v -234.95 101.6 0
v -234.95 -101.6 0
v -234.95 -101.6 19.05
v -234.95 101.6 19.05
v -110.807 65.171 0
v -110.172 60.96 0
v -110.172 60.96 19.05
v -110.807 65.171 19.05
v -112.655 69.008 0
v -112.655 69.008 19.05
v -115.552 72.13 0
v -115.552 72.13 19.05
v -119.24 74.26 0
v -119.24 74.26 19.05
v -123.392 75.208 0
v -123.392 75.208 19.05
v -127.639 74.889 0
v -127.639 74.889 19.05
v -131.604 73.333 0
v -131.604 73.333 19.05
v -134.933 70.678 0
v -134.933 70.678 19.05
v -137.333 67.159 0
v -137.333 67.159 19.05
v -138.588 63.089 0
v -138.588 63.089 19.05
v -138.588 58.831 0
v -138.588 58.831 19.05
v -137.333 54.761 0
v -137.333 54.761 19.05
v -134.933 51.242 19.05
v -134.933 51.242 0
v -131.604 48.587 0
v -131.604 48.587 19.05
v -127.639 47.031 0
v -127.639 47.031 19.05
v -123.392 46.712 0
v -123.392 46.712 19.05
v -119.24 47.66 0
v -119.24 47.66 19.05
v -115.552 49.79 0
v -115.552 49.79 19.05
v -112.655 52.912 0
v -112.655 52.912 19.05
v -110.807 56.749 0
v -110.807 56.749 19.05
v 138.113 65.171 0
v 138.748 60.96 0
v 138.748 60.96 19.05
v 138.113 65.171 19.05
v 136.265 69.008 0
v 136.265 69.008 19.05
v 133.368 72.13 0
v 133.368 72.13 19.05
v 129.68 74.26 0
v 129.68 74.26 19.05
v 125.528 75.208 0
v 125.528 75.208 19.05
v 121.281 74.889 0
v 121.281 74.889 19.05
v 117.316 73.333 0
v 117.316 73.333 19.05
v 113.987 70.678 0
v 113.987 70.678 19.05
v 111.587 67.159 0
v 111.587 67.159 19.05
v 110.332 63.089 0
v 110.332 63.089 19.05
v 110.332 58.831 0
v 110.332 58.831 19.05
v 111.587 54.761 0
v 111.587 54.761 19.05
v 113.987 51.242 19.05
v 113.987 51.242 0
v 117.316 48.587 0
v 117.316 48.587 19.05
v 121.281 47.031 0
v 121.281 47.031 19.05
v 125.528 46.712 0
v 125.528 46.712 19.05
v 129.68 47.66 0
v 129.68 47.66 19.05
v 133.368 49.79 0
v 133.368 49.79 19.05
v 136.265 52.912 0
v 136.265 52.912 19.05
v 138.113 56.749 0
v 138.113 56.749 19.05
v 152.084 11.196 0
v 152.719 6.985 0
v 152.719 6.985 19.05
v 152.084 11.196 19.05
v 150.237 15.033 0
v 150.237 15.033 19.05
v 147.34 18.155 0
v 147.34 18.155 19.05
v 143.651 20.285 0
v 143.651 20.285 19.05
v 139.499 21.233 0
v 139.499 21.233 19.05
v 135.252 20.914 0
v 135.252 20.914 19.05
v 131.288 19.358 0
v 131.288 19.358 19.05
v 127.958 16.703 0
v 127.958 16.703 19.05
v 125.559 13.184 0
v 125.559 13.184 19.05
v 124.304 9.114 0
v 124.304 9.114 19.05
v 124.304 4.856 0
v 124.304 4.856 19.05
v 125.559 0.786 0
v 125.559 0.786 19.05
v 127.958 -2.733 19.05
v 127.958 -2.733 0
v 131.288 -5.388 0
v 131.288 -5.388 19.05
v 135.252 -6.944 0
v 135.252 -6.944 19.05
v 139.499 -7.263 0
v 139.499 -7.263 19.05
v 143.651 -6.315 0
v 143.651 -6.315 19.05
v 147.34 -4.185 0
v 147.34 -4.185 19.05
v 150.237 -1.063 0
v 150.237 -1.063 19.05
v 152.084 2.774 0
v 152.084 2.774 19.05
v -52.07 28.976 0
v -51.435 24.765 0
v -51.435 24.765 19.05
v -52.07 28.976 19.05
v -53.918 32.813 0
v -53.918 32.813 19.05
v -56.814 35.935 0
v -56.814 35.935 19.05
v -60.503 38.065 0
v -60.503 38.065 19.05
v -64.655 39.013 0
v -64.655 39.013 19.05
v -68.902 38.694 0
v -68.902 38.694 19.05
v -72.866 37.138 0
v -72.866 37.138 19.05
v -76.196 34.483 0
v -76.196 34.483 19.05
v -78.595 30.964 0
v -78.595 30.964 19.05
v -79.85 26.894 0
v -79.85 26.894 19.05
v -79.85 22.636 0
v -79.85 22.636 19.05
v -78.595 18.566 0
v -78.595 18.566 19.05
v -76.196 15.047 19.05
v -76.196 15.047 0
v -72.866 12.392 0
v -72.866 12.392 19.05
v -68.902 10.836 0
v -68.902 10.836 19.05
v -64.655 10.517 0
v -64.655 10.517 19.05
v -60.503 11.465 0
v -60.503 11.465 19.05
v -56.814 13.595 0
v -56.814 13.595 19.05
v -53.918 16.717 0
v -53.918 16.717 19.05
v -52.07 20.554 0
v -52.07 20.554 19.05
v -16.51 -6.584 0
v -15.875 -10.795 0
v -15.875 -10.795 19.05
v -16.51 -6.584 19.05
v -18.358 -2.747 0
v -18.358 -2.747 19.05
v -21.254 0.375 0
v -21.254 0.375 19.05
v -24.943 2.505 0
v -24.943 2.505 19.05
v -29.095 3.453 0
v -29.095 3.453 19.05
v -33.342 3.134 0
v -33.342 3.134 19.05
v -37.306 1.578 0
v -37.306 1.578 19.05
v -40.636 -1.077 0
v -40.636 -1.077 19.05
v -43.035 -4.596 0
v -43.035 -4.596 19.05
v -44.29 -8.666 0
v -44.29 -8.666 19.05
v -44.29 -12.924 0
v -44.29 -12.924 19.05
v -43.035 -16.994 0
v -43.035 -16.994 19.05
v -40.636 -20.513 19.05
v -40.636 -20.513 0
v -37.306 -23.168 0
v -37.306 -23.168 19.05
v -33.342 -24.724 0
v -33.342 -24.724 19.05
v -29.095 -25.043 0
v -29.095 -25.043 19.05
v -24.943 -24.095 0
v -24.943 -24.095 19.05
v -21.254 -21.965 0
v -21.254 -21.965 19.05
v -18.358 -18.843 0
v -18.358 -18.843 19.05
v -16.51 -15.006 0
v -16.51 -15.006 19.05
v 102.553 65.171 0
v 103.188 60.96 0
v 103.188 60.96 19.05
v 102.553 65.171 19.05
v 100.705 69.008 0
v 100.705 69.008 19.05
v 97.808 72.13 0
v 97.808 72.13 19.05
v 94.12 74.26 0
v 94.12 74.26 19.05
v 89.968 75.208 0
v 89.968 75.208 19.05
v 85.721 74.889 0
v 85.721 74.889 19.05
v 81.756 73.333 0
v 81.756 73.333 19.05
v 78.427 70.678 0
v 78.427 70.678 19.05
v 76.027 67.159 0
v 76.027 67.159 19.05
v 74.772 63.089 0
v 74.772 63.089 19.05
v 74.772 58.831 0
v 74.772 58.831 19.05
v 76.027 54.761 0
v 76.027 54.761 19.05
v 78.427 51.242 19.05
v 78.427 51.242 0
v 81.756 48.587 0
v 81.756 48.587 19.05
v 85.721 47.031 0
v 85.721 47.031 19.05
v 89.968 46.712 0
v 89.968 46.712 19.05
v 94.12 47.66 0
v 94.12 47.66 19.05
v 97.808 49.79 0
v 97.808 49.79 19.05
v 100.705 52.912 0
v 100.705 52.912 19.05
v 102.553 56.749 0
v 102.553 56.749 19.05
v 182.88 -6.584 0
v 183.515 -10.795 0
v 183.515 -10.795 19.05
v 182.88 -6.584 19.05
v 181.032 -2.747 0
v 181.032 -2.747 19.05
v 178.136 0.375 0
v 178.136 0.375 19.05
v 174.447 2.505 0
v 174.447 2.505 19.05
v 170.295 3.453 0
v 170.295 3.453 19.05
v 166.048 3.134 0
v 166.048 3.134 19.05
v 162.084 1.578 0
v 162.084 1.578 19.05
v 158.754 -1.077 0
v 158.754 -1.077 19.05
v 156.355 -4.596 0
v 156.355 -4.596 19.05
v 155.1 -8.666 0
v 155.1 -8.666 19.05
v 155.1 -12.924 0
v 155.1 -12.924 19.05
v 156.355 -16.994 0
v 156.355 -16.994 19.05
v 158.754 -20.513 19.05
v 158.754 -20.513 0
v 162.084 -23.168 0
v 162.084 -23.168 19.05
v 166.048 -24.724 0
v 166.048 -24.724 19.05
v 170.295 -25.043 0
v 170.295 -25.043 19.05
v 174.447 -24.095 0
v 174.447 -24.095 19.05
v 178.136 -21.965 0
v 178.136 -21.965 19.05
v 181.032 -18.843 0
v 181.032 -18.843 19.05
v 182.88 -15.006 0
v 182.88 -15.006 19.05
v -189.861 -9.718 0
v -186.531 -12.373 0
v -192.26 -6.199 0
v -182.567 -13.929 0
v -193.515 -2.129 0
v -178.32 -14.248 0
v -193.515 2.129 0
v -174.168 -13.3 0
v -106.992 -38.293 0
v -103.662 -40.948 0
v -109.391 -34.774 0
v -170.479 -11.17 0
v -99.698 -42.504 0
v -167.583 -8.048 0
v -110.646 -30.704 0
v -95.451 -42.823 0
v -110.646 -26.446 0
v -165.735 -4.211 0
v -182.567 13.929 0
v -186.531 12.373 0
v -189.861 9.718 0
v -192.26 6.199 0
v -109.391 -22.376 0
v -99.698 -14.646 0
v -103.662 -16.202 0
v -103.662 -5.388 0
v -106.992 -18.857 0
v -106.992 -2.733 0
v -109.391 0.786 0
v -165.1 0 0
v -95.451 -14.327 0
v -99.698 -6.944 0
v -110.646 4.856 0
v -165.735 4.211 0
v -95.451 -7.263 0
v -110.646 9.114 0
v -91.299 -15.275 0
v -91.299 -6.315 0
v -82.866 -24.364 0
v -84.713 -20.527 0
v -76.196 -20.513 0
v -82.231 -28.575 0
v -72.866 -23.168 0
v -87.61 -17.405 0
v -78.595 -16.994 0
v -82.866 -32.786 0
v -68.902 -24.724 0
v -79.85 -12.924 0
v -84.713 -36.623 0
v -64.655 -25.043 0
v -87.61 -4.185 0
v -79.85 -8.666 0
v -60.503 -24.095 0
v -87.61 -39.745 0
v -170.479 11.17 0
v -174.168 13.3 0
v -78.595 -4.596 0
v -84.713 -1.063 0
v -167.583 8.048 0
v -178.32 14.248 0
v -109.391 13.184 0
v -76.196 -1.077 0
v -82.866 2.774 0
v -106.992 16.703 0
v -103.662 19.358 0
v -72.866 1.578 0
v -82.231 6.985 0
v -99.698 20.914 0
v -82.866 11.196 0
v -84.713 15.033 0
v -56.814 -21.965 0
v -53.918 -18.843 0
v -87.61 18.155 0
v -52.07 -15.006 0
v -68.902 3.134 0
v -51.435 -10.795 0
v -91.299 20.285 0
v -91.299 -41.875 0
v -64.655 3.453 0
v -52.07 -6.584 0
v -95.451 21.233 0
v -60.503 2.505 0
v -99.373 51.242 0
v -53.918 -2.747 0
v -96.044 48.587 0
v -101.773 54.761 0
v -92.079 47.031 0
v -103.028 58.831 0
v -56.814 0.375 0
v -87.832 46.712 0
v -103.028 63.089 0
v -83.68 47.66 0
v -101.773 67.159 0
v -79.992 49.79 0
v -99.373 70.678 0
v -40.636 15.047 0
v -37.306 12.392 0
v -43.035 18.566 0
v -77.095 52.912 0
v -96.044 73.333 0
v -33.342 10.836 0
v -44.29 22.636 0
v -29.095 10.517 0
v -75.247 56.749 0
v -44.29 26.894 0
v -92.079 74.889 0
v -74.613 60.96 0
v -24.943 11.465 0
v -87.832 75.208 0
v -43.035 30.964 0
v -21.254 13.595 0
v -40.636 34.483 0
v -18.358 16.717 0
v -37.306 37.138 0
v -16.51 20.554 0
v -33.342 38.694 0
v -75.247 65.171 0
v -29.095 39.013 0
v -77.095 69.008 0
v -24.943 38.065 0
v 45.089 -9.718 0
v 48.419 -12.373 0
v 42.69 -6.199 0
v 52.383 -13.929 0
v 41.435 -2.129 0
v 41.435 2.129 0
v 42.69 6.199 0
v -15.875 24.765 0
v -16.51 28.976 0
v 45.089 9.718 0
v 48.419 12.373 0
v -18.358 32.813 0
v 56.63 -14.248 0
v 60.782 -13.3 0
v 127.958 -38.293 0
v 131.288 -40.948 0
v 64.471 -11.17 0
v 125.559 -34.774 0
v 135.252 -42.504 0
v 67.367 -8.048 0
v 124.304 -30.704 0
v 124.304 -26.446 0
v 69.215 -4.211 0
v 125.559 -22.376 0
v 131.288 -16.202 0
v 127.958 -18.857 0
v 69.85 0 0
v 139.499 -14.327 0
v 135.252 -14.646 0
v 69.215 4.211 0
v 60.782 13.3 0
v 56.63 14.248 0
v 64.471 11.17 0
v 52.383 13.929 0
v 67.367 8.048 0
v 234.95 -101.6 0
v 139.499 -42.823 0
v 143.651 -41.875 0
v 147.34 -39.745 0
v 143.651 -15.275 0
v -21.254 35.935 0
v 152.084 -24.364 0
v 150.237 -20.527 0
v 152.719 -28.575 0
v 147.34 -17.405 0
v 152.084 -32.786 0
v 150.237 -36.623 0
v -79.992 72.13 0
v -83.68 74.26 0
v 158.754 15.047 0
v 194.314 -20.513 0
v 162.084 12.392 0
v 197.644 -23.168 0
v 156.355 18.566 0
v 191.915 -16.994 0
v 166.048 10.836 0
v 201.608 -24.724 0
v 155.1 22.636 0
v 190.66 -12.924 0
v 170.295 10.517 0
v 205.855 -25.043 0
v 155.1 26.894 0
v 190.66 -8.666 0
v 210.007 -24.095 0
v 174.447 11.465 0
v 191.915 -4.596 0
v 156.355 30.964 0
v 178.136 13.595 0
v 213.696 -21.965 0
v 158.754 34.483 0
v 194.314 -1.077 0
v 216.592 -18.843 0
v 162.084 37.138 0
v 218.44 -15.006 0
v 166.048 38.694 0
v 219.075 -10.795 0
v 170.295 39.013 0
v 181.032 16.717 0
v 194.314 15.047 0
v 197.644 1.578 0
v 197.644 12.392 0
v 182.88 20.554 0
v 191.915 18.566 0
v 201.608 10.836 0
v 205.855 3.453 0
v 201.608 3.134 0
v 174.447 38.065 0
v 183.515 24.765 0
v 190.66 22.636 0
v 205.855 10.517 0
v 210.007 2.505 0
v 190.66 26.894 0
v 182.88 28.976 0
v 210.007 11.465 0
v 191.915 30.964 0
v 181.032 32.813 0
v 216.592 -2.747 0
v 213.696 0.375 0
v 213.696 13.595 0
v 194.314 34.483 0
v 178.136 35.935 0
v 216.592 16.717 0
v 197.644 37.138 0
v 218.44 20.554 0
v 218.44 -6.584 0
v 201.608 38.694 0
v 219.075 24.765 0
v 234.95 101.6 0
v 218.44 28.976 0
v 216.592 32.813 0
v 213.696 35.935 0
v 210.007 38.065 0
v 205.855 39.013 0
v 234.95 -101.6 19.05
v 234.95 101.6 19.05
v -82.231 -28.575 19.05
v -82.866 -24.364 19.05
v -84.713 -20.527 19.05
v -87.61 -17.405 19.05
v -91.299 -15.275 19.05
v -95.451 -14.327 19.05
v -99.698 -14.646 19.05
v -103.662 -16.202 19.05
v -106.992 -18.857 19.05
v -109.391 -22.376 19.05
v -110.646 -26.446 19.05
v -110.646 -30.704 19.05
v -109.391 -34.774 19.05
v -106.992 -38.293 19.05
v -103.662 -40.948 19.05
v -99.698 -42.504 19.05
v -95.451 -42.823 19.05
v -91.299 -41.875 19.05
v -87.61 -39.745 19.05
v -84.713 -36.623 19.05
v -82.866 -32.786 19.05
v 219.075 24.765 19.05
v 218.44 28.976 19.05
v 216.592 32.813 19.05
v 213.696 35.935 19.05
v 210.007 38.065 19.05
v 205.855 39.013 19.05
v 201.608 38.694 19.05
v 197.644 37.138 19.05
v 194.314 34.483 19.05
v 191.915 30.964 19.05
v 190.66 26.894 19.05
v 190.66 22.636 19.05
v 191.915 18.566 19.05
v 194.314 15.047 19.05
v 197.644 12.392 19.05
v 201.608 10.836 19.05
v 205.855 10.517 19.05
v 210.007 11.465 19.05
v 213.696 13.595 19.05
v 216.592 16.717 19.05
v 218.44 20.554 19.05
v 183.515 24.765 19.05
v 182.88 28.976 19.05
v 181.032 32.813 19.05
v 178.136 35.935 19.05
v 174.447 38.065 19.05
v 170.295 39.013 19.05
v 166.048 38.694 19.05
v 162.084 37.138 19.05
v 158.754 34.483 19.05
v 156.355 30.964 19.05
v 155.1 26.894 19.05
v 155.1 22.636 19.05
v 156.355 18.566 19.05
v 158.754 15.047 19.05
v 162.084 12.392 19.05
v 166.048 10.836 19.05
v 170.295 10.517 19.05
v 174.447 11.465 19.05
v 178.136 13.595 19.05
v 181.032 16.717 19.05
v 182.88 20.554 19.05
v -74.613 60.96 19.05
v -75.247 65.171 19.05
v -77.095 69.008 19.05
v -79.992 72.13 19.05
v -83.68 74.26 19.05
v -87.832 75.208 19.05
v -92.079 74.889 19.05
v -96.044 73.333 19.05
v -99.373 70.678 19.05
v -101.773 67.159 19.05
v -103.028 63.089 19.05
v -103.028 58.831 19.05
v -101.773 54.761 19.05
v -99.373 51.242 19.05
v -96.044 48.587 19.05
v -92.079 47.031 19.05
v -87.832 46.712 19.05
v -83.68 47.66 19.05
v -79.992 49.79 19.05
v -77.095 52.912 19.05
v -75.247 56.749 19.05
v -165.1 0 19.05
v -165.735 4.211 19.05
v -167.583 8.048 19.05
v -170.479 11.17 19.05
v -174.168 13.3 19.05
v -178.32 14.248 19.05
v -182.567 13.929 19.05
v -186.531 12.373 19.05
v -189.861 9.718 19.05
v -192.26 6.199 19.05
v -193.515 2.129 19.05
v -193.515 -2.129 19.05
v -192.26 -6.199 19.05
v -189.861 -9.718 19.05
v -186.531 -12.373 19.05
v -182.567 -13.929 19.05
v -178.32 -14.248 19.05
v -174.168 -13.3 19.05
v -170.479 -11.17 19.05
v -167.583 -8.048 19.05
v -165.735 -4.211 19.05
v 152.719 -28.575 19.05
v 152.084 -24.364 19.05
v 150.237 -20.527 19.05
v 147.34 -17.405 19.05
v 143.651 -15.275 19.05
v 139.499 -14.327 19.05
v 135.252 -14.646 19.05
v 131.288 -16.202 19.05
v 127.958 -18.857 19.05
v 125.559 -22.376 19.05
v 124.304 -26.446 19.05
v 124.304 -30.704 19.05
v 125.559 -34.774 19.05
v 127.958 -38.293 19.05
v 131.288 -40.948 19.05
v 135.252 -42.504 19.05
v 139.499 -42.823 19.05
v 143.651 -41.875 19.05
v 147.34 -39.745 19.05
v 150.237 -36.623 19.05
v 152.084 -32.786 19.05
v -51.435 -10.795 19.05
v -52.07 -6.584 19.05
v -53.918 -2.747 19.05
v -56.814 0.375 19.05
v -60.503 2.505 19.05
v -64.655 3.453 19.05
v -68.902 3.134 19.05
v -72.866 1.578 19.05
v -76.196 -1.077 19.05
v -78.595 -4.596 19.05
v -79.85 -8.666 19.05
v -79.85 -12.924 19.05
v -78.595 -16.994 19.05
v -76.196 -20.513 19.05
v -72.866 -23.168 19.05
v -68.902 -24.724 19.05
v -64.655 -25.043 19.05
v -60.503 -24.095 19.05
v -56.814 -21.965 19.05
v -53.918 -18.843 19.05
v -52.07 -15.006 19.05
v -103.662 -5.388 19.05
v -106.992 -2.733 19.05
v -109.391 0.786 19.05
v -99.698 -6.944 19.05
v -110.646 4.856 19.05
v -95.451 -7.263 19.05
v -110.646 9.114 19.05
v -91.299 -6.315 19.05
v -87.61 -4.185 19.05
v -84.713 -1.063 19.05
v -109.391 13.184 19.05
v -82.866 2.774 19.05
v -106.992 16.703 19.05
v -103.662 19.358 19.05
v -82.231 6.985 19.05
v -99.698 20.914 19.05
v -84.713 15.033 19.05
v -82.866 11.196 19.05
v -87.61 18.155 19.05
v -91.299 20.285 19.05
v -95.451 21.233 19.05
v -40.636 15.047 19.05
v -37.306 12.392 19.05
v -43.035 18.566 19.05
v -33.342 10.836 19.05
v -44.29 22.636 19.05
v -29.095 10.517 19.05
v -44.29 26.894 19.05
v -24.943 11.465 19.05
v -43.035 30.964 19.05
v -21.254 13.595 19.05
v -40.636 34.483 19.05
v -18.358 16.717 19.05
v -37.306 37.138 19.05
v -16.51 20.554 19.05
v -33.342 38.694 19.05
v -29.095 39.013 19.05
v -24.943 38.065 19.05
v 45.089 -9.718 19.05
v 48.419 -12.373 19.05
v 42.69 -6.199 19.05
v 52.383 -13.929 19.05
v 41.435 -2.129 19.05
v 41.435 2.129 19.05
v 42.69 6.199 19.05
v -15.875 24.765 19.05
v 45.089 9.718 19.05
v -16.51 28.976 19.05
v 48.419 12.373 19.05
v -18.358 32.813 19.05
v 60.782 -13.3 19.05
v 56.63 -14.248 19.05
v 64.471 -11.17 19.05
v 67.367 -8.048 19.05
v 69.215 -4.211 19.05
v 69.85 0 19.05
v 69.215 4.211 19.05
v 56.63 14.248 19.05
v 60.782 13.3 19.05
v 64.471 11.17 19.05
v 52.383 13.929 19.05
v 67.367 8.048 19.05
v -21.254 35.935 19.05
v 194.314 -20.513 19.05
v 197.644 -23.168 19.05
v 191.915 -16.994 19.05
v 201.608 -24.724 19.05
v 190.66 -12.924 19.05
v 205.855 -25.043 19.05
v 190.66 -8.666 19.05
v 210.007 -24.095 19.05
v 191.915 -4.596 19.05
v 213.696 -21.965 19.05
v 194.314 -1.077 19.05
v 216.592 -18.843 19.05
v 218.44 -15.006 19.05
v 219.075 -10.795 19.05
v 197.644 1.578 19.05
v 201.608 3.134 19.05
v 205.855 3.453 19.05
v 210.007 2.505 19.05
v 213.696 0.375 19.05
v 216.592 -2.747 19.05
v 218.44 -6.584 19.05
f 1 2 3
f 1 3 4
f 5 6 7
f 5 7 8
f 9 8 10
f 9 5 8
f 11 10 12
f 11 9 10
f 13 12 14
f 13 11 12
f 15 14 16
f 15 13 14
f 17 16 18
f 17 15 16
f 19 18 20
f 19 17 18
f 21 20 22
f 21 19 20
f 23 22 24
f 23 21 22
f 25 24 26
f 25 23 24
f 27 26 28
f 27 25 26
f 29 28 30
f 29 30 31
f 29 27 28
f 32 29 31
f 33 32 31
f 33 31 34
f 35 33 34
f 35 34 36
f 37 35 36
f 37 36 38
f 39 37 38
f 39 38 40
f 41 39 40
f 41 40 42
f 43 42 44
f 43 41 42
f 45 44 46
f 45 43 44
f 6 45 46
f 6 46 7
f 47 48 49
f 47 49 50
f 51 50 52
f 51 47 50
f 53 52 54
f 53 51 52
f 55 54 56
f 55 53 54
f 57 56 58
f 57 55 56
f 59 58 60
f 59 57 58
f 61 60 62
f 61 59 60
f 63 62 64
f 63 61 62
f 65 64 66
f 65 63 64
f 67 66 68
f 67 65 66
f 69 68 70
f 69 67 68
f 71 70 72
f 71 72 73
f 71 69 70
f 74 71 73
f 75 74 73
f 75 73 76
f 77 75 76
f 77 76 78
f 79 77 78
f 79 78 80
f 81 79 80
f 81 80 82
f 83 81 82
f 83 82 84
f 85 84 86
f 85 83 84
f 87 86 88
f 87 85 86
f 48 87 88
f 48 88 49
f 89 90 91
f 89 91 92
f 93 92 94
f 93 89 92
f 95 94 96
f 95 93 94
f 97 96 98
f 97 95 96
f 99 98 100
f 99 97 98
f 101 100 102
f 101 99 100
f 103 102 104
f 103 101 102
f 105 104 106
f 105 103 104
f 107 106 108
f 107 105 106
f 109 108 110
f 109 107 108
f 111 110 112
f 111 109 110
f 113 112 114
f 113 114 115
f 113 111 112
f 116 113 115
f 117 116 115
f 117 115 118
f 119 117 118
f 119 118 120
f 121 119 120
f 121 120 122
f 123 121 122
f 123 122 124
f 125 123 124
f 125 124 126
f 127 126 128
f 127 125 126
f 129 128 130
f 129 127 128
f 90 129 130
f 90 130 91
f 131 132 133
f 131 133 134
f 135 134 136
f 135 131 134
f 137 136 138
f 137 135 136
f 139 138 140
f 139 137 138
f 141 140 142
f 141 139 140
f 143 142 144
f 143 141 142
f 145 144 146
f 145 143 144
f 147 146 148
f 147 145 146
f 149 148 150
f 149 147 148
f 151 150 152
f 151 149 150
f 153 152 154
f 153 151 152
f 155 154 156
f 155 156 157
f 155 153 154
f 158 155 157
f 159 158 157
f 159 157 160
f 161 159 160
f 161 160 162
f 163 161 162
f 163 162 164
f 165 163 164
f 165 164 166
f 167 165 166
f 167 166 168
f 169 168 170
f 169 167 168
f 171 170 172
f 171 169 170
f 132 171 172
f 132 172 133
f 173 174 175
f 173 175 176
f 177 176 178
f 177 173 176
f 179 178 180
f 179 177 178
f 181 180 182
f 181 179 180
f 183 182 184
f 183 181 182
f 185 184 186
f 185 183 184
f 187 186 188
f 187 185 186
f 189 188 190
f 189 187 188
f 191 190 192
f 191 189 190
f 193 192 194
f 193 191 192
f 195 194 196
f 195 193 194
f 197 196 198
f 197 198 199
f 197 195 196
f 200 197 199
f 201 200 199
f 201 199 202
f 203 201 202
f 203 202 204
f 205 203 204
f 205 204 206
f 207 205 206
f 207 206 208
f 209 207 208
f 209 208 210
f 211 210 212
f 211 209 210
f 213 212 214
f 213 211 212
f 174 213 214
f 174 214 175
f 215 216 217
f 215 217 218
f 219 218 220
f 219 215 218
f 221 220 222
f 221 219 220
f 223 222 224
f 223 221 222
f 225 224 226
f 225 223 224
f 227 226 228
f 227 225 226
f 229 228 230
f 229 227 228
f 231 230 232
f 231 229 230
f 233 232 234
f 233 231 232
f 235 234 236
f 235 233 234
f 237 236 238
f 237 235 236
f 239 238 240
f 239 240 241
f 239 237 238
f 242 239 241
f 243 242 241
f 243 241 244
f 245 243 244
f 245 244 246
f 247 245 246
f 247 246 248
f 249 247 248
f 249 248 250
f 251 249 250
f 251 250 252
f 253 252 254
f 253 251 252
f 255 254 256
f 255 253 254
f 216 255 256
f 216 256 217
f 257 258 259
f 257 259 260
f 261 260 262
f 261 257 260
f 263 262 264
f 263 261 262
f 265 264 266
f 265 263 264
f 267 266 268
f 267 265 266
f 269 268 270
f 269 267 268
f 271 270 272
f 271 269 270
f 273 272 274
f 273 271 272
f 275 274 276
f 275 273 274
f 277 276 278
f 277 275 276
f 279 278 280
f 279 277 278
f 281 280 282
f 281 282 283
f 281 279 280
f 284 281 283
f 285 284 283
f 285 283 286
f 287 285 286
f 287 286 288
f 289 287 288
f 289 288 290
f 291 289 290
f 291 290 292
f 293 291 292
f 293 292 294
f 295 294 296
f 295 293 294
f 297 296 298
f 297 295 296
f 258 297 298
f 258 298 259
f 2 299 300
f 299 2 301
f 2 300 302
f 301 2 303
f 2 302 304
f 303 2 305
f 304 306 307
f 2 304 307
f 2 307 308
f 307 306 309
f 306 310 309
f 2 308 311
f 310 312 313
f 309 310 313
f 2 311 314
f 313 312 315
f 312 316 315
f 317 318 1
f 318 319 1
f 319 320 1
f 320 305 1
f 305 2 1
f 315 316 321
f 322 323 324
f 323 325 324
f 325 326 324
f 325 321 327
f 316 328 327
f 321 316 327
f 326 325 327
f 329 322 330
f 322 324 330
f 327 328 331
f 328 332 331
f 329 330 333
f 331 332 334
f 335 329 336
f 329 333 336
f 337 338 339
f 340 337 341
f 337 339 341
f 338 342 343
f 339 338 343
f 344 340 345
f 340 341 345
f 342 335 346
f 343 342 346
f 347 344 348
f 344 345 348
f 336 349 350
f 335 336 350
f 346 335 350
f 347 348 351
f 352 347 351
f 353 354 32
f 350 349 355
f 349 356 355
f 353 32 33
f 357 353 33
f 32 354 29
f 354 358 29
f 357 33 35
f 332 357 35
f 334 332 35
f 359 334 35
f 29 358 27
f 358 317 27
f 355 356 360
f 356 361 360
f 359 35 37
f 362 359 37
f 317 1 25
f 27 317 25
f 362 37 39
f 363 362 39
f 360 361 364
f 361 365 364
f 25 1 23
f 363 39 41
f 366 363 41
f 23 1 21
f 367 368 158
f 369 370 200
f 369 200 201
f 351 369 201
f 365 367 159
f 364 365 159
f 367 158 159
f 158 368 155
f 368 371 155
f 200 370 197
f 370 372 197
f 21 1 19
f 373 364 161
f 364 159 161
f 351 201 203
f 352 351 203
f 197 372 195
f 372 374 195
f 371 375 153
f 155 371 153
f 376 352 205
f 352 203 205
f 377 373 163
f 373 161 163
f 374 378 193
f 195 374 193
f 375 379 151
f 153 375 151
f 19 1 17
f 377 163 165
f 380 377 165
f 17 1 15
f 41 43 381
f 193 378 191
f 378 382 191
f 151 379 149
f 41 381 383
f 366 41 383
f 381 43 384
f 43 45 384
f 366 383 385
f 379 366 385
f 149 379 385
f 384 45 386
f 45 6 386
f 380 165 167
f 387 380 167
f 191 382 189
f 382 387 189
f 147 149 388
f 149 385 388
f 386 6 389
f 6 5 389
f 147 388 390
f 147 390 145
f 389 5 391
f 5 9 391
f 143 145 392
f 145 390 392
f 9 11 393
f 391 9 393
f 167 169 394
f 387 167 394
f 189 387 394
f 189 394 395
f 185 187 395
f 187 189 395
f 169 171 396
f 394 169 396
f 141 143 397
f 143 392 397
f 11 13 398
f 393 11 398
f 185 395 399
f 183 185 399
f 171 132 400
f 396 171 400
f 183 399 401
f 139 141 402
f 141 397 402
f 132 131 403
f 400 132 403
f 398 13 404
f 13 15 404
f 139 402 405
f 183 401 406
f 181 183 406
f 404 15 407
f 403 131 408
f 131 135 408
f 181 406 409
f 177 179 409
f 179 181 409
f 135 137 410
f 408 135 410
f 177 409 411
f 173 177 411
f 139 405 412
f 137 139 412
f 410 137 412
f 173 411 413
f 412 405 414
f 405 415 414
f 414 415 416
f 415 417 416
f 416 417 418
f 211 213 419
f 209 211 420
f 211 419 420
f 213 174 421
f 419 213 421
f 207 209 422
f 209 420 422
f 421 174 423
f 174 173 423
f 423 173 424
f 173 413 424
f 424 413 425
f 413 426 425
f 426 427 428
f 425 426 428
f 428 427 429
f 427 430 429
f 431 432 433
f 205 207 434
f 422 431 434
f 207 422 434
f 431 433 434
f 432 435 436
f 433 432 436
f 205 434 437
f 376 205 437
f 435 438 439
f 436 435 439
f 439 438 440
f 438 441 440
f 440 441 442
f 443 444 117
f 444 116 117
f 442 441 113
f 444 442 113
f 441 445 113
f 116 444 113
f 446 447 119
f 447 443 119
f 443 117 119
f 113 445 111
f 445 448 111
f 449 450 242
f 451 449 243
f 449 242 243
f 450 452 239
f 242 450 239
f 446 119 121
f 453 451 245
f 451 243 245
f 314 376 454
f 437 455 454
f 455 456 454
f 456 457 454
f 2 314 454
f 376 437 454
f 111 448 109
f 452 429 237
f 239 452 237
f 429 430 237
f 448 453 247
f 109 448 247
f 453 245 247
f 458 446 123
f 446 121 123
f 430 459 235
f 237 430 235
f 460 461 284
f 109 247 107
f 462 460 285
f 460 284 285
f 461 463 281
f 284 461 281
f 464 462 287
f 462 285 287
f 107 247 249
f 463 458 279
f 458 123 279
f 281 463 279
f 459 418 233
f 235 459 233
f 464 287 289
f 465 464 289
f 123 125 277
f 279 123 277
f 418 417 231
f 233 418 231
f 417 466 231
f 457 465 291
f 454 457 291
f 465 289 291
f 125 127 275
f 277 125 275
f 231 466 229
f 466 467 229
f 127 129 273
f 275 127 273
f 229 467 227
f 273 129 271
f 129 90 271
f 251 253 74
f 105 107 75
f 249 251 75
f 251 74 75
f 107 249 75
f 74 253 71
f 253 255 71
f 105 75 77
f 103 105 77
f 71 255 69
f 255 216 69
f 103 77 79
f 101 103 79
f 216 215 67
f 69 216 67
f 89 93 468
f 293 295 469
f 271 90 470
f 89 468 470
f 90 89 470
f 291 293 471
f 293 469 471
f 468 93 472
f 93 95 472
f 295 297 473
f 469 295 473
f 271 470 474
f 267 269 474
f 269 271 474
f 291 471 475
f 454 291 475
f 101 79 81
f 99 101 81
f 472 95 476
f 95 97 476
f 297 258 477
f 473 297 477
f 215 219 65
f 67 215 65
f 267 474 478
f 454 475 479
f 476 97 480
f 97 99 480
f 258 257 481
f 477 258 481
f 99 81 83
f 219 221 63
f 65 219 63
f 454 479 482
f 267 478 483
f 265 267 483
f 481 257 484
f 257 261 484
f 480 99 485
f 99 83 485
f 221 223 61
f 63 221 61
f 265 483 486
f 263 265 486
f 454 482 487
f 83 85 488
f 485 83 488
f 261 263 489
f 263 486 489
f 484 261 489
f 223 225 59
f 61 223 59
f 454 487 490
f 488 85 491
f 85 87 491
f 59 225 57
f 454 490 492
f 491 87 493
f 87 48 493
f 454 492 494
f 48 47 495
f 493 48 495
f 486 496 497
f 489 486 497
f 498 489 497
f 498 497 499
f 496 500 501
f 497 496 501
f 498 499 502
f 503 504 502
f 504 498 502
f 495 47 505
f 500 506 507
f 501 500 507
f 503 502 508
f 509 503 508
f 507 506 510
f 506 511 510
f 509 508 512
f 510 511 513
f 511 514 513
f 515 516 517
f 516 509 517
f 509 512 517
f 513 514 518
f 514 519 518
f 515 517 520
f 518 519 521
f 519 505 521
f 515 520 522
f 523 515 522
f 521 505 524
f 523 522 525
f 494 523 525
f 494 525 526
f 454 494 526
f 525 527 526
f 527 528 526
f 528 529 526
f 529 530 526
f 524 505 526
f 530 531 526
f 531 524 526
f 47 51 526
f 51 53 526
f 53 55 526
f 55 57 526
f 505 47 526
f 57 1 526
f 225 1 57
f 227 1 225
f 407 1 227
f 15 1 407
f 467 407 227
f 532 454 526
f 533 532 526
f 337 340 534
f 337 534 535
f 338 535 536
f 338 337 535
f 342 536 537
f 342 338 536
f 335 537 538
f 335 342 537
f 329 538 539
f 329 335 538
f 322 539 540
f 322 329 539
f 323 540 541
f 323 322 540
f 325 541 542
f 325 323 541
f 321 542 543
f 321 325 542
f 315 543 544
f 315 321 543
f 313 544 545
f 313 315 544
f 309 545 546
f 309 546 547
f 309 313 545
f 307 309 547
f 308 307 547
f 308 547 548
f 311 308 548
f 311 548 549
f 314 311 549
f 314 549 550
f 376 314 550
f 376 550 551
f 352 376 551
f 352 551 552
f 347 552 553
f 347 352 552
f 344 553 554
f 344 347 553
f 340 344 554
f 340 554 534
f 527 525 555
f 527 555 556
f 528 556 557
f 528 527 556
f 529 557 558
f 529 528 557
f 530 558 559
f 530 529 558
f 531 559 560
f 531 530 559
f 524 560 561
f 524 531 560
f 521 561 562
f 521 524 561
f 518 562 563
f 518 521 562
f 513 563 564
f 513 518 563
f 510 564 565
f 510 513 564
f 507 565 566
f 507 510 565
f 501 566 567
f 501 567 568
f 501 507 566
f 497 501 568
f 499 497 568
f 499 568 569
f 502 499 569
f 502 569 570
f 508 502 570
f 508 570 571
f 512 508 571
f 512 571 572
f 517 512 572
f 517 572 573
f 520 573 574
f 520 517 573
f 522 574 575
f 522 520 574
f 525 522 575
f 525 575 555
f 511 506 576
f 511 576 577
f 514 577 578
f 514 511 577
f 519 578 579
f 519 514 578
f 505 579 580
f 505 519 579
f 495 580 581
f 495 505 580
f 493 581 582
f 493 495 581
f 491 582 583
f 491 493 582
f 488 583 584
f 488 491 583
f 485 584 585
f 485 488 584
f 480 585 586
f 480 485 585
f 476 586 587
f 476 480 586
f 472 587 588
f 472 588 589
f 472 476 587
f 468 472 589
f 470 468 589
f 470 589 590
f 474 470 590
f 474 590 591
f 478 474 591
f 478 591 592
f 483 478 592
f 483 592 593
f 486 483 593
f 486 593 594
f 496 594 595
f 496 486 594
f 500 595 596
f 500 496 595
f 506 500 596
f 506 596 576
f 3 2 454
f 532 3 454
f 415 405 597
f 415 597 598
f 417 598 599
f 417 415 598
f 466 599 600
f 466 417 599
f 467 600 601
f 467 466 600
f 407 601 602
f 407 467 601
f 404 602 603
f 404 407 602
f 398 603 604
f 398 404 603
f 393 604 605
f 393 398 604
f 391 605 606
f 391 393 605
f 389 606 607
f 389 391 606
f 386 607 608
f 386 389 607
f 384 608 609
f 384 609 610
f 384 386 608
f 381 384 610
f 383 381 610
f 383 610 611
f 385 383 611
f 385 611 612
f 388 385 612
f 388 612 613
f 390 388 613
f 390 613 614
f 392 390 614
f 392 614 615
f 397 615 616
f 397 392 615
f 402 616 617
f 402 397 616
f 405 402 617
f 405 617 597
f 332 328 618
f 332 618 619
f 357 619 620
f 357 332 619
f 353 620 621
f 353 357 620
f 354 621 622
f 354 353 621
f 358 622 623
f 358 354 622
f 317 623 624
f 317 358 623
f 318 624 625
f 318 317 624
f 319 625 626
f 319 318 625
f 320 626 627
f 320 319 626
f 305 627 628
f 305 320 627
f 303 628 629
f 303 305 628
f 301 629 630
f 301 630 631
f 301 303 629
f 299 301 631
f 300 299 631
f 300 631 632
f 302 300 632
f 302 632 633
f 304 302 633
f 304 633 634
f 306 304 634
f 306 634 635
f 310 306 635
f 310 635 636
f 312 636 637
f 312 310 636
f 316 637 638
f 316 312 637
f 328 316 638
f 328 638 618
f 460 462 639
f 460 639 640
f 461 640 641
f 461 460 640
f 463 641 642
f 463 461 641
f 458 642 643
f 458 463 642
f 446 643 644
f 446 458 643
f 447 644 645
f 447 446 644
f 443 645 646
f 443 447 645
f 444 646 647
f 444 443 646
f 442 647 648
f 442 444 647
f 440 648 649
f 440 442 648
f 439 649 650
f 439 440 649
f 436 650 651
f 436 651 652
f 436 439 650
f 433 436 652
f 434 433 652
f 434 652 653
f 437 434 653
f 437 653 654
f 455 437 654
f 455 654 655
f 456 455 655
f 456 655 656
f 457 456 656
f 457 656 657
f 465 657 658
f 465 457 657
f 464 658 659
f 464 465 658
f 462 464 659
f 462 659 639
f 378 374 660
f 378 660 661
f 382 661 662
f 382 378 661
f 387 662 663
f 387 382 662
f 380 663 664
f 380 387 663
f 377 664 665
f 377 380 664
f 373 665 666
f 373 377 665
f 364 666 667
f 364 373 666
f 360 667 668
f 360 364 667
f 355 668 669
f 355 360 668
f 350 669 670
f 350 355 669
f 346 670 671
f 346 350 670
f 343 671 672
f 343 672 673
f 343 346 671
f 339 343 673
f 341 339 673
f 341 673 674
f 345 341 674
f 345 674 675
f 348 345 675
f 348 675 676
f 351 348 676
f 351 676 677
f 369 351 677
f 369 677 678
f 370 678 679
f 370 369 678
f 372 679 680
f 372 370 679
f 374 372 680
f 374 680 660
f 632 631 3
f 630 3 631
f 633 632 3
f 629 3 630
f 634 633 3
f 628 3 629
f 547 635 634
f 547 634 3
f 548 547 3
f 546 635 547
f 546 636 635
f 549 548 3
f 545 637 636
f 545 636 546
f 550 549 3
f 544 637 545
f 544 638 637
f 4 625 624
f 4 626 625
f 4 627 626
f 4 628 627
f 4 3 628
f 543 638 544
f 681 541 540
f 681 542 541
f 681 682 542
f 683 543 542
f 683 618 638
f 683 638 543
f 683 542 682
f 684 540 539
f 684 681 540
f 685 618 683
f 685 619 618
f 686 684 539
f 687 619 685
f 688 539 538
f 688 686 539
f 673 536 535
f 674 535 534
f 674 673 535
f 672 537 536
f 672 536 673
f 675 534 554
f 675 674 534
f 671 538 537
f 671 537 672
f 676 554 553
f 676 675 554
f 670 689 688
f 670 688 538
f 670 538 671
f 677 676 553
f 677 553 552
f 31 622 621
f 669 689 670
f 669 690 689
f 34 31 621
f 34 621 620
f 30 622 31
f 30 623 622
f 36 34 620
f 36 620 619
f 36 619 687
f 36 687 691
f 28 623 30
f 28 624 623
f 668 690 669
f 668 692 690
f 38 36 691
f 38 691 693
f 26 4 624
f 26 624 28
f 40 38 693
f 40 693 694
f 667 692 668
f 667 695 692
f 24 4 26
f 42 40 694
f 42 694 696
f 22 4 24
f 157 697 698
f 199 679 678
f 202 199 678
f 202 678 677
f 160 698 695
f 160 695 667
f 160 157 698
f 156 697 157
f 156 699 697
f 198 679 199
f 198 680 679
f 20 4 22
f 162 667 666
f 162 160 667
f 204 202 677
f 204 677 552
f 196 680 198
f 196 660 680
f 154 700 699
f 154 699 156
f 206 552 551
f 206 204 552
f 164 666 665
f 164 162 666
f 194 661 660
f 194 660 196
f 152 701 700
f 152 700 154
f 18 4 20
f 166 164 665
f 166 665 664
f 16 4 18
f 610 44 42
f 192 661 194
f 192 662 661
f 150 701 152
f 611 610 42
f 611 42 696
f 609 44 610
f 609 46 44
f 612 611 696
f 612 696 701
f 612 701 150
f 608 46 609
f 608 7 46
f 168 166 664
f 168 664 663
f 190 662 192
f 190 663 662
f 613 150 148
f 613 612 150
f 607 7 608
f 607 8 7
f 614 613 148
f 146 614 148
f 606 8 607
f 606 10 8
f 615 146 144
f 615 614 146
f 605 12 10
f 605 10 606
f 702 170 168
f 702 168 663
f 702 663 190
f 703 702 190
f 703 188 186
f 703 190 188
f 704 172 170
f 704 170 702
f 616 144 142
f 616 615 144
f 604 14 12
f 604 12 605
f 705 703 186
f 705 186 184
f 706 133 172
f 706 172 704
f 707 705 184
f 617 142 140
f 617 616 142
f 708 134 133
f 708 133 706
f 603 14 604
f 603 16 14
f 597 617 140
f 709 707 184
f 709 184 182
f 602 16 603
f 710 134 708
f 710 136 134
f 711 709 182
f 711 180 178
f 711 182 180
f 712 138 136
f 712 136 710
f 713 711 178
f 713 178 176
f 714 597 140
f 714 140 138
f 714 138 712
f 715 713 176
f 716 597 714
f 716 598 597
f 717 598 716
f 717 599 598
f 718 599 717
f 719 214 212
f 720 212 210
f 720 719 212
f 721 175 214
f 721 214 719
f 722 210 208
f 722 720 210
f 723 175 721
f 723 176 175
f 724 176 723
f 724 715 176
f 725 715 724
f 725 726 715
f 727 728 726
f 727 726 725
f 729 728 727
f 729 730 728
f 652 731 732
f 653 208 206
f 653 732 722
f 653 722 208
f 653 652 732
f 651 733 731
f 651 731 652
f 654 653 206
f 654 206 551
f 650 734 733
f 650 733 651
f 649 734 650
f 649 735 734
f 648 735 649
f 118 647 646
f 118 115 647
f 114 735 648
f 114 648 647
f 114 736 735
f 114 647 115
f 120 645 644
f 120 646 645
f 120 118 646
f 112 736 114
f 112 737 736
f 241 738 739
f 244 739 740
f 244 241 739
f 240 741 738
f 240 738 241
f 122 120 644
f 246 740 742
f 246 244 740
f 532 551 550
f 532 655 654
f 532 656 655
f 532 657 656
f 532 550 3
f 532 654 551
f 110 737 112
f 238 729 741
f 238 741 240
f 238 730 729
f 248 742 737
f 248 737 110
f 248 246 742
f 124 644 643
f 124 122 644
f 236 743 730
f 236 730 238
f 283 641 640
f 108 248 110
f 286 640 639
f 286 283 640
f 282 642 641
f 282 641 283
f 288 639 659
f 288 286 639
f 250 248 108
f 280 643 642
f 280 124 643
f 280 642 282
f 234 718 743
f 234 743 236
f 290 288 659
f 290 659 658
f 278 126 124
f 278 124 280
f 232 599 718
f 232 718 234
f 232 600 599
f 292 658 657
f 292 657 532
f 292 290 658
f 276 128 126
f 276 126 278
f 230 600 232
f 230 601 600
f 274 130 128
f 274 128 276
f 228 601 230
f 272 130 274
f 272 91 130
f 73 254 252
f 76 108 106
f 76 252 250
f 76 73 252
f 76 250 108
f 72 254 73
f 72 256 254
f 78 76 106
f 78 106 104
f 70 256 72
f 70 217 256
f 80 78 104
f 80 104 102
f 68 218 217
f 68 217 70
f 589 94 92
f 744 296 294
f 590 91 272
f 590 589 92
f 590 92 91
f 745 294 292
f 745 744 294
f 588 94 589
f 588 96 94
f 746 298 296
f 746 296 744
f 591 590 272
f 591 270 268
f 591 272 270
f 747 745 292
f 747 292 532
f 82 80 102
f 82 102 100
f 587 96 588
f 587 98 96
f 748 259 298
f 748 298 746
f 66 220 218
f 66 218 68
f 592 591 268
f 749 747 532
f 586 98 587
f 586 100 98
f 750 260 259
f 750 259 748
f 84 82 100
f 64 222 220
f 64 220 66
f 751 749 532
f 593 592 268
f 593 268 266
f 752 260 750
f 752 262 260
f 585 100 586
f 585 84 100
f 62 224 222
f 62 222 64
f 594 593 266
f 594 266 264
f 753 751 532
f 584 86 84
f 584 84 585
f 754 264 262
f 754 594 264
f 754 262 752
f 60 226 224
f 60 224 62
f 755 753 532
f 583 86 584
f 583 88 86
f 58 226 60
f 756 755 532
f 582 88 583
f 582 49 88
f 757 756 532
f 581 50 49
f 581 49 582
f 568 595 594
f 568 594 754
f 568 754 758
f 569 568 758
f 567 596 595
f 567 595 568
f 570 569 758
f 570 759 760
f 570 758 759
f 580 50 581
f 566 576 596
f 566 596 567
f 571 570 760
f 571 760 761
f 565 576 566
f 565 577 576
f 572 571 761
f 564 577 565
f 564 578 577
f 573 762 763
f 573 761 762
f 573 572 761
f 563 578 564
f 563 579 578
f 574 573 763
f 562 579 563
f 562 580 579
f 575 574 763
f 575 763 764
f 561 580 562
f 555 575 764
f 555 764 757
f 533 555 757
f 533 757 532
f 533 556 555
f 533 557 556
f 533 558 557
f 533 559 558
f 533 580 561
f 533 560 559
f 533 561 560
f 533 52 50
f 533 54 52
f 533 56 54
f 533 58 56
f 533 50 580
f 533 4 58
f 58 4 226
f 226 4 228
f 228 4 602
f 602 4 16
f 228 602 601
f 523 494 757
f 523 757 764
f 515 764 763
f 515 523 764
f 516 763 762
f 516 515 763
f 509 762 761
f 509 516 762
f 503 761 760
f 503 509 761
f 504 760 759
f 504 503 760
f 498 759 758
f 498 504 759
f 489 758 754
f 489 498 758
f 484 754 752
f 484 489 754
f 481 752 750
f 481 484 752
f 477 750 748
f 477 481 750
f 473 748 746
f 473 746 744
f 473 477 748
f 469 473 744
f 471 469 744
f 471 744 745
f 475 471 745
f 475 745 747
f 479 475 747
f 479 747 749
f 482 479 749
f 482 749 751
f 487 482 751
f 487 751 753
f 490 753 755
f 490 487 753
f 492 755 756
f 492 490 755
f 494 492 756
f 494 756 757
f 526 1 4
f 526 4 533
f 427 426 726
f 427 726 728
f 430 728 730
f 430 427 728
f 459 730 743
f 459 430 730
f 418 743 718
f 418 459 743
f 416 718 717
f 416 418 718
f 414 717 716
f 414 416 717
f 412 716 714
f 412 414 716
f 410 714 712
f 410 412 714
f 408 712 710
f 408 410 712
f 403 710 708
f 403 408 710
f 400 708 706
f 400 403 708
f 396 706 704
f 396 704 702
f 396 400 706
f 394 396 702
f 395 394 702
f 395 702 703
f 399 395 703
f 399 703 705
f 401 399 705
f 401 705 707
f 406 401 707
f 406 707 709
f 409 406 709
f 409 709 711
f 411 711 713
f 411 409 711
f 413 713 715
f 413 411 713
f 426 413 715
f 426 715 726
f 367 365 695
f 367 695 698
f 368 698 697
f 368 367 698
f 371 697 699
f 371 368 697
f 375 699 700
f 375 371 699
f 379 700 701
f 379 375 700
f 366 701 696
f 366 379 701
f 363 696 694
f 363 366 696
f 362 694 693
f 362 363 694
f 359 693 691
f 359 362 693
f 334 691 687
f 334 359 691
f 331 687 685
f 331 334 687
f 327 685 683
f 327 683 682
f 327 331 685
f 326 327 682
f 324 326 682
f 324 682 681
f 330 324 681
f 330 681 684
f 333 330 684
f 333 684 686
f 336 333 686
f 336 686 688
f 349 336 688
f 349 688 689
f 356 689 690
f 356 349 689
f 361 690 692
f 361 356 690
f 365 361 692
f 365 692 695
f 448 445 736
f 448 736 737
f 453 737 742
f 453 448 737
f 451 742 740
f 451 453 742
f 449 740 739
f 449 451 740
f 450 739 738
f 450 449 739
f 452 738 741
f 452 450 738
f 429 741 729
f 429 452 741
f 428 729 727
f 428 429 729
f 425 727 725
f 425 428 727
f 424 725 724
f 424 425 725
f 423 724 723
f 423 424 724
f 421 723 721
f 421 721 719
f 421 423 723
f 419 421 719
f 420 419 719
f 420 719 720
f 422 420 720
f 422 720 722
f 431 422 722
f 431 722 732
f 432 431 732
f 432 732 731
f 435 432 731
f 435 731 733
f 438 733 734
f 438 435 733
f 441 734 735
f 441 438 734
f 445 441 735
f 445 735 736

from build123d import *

# Parameters (mm, degrees)
F0_W     = 469.9
F0_H     = 203.2
F0_W_2   = 79.375
F0_H_2   = 88.9
F0_R     = 14.2875
F1_DEPTH = 19.05


with BuildPart() as f1:
    # F0 (on Top) → F1 (new body)
    with BuildSketch(Plane.XY):
        Rectangle(F0_W, F0_H)
        with Locations((-179.3875, 0)):
            Rectangle(F0_W_2, F0_H_2, mode=Mode.SUBTRACT)
        with Locations((-96.518363, -28.575)):
            Circle(F0_R, mode=Mode.SUBTRACT)
        with Locations((-65.7225, -10.795)):
            Circle(F0_R, mode=Mode.SUBTRACT)
        with Locations((-30.1625, -10.795)):
            Circle(F0_R, mode=Mode.SUBTRACT)
        with Locations((55.5625, 0)):
            Rectangle(F0_W_2, F0_H_2, mode=Mode.SUBTRACT)
        with Locations((138.431637, -28.575)):
            Circle(F0_R, mode=Mode.SUBTRACT)
        with Locations((169.2275, -10.795)):
            Circle(F0_R, mode=Mode.SUBTRACT)
        with Locations((204.7875, -10.795)):
            Circle(F0_R, mode=Mode.SUBTRACT)
        with Locations((-96.518363, 6.985)):
            Circle(F0_R, mode=Mode.SUBTRACT)
        with Locations((-65.7225, 24.765)):
            Circle(F0_R, mode=Mode.SUBTRACT)
        with Locations((-30.1625, 24.765)):
            Circle(F0_R, mode=Mode.SUBTRACT)
        with Locations((-124.46, 60.96)):
            Circle(F0_R, mode=Mode.SUBTRACT)
        with Locations((-88.9, 60.96)):
            Circle(F0_R, mode=Mode.SUBTRACT)
        with Locations((138.431637, 6.985)):
            Circle(F0_R, mode=Mode.SUBTRACT)
        with Locations((169.2275, 24.765)):
            Circle(F0_R, mode=Mode.SUBTRACT)
        with Locations((204.7875, 24.765)):
            Circle(F0_R, mode=Mode.SUBTRACT)
        with Locations((88.9, 60.96)):
            Circle(F0_R, mode=Mode.SUBTRACT)
        with Locations((124.46, 60.96)):
            Circle(F0_R, mode=Mode.SUBTRACT)
        with Locations((-179.3875, 0)):
            Rectangle(F0_W_2, F0_H_2)
        with Locations((-179.3875, 0)):
            Circle(F0_R, mode=Mode.SUBTRACT)
        with Locations((55.5625, 0)):
            Rectangle(F0_W_2, F0_H_2)
        with Locations((55.5625, 0)):
            Circle(F0_R, mode=Mode.SUBTRACT)
    extrude(amount=F1_DEPTH)


solid = f1.part
